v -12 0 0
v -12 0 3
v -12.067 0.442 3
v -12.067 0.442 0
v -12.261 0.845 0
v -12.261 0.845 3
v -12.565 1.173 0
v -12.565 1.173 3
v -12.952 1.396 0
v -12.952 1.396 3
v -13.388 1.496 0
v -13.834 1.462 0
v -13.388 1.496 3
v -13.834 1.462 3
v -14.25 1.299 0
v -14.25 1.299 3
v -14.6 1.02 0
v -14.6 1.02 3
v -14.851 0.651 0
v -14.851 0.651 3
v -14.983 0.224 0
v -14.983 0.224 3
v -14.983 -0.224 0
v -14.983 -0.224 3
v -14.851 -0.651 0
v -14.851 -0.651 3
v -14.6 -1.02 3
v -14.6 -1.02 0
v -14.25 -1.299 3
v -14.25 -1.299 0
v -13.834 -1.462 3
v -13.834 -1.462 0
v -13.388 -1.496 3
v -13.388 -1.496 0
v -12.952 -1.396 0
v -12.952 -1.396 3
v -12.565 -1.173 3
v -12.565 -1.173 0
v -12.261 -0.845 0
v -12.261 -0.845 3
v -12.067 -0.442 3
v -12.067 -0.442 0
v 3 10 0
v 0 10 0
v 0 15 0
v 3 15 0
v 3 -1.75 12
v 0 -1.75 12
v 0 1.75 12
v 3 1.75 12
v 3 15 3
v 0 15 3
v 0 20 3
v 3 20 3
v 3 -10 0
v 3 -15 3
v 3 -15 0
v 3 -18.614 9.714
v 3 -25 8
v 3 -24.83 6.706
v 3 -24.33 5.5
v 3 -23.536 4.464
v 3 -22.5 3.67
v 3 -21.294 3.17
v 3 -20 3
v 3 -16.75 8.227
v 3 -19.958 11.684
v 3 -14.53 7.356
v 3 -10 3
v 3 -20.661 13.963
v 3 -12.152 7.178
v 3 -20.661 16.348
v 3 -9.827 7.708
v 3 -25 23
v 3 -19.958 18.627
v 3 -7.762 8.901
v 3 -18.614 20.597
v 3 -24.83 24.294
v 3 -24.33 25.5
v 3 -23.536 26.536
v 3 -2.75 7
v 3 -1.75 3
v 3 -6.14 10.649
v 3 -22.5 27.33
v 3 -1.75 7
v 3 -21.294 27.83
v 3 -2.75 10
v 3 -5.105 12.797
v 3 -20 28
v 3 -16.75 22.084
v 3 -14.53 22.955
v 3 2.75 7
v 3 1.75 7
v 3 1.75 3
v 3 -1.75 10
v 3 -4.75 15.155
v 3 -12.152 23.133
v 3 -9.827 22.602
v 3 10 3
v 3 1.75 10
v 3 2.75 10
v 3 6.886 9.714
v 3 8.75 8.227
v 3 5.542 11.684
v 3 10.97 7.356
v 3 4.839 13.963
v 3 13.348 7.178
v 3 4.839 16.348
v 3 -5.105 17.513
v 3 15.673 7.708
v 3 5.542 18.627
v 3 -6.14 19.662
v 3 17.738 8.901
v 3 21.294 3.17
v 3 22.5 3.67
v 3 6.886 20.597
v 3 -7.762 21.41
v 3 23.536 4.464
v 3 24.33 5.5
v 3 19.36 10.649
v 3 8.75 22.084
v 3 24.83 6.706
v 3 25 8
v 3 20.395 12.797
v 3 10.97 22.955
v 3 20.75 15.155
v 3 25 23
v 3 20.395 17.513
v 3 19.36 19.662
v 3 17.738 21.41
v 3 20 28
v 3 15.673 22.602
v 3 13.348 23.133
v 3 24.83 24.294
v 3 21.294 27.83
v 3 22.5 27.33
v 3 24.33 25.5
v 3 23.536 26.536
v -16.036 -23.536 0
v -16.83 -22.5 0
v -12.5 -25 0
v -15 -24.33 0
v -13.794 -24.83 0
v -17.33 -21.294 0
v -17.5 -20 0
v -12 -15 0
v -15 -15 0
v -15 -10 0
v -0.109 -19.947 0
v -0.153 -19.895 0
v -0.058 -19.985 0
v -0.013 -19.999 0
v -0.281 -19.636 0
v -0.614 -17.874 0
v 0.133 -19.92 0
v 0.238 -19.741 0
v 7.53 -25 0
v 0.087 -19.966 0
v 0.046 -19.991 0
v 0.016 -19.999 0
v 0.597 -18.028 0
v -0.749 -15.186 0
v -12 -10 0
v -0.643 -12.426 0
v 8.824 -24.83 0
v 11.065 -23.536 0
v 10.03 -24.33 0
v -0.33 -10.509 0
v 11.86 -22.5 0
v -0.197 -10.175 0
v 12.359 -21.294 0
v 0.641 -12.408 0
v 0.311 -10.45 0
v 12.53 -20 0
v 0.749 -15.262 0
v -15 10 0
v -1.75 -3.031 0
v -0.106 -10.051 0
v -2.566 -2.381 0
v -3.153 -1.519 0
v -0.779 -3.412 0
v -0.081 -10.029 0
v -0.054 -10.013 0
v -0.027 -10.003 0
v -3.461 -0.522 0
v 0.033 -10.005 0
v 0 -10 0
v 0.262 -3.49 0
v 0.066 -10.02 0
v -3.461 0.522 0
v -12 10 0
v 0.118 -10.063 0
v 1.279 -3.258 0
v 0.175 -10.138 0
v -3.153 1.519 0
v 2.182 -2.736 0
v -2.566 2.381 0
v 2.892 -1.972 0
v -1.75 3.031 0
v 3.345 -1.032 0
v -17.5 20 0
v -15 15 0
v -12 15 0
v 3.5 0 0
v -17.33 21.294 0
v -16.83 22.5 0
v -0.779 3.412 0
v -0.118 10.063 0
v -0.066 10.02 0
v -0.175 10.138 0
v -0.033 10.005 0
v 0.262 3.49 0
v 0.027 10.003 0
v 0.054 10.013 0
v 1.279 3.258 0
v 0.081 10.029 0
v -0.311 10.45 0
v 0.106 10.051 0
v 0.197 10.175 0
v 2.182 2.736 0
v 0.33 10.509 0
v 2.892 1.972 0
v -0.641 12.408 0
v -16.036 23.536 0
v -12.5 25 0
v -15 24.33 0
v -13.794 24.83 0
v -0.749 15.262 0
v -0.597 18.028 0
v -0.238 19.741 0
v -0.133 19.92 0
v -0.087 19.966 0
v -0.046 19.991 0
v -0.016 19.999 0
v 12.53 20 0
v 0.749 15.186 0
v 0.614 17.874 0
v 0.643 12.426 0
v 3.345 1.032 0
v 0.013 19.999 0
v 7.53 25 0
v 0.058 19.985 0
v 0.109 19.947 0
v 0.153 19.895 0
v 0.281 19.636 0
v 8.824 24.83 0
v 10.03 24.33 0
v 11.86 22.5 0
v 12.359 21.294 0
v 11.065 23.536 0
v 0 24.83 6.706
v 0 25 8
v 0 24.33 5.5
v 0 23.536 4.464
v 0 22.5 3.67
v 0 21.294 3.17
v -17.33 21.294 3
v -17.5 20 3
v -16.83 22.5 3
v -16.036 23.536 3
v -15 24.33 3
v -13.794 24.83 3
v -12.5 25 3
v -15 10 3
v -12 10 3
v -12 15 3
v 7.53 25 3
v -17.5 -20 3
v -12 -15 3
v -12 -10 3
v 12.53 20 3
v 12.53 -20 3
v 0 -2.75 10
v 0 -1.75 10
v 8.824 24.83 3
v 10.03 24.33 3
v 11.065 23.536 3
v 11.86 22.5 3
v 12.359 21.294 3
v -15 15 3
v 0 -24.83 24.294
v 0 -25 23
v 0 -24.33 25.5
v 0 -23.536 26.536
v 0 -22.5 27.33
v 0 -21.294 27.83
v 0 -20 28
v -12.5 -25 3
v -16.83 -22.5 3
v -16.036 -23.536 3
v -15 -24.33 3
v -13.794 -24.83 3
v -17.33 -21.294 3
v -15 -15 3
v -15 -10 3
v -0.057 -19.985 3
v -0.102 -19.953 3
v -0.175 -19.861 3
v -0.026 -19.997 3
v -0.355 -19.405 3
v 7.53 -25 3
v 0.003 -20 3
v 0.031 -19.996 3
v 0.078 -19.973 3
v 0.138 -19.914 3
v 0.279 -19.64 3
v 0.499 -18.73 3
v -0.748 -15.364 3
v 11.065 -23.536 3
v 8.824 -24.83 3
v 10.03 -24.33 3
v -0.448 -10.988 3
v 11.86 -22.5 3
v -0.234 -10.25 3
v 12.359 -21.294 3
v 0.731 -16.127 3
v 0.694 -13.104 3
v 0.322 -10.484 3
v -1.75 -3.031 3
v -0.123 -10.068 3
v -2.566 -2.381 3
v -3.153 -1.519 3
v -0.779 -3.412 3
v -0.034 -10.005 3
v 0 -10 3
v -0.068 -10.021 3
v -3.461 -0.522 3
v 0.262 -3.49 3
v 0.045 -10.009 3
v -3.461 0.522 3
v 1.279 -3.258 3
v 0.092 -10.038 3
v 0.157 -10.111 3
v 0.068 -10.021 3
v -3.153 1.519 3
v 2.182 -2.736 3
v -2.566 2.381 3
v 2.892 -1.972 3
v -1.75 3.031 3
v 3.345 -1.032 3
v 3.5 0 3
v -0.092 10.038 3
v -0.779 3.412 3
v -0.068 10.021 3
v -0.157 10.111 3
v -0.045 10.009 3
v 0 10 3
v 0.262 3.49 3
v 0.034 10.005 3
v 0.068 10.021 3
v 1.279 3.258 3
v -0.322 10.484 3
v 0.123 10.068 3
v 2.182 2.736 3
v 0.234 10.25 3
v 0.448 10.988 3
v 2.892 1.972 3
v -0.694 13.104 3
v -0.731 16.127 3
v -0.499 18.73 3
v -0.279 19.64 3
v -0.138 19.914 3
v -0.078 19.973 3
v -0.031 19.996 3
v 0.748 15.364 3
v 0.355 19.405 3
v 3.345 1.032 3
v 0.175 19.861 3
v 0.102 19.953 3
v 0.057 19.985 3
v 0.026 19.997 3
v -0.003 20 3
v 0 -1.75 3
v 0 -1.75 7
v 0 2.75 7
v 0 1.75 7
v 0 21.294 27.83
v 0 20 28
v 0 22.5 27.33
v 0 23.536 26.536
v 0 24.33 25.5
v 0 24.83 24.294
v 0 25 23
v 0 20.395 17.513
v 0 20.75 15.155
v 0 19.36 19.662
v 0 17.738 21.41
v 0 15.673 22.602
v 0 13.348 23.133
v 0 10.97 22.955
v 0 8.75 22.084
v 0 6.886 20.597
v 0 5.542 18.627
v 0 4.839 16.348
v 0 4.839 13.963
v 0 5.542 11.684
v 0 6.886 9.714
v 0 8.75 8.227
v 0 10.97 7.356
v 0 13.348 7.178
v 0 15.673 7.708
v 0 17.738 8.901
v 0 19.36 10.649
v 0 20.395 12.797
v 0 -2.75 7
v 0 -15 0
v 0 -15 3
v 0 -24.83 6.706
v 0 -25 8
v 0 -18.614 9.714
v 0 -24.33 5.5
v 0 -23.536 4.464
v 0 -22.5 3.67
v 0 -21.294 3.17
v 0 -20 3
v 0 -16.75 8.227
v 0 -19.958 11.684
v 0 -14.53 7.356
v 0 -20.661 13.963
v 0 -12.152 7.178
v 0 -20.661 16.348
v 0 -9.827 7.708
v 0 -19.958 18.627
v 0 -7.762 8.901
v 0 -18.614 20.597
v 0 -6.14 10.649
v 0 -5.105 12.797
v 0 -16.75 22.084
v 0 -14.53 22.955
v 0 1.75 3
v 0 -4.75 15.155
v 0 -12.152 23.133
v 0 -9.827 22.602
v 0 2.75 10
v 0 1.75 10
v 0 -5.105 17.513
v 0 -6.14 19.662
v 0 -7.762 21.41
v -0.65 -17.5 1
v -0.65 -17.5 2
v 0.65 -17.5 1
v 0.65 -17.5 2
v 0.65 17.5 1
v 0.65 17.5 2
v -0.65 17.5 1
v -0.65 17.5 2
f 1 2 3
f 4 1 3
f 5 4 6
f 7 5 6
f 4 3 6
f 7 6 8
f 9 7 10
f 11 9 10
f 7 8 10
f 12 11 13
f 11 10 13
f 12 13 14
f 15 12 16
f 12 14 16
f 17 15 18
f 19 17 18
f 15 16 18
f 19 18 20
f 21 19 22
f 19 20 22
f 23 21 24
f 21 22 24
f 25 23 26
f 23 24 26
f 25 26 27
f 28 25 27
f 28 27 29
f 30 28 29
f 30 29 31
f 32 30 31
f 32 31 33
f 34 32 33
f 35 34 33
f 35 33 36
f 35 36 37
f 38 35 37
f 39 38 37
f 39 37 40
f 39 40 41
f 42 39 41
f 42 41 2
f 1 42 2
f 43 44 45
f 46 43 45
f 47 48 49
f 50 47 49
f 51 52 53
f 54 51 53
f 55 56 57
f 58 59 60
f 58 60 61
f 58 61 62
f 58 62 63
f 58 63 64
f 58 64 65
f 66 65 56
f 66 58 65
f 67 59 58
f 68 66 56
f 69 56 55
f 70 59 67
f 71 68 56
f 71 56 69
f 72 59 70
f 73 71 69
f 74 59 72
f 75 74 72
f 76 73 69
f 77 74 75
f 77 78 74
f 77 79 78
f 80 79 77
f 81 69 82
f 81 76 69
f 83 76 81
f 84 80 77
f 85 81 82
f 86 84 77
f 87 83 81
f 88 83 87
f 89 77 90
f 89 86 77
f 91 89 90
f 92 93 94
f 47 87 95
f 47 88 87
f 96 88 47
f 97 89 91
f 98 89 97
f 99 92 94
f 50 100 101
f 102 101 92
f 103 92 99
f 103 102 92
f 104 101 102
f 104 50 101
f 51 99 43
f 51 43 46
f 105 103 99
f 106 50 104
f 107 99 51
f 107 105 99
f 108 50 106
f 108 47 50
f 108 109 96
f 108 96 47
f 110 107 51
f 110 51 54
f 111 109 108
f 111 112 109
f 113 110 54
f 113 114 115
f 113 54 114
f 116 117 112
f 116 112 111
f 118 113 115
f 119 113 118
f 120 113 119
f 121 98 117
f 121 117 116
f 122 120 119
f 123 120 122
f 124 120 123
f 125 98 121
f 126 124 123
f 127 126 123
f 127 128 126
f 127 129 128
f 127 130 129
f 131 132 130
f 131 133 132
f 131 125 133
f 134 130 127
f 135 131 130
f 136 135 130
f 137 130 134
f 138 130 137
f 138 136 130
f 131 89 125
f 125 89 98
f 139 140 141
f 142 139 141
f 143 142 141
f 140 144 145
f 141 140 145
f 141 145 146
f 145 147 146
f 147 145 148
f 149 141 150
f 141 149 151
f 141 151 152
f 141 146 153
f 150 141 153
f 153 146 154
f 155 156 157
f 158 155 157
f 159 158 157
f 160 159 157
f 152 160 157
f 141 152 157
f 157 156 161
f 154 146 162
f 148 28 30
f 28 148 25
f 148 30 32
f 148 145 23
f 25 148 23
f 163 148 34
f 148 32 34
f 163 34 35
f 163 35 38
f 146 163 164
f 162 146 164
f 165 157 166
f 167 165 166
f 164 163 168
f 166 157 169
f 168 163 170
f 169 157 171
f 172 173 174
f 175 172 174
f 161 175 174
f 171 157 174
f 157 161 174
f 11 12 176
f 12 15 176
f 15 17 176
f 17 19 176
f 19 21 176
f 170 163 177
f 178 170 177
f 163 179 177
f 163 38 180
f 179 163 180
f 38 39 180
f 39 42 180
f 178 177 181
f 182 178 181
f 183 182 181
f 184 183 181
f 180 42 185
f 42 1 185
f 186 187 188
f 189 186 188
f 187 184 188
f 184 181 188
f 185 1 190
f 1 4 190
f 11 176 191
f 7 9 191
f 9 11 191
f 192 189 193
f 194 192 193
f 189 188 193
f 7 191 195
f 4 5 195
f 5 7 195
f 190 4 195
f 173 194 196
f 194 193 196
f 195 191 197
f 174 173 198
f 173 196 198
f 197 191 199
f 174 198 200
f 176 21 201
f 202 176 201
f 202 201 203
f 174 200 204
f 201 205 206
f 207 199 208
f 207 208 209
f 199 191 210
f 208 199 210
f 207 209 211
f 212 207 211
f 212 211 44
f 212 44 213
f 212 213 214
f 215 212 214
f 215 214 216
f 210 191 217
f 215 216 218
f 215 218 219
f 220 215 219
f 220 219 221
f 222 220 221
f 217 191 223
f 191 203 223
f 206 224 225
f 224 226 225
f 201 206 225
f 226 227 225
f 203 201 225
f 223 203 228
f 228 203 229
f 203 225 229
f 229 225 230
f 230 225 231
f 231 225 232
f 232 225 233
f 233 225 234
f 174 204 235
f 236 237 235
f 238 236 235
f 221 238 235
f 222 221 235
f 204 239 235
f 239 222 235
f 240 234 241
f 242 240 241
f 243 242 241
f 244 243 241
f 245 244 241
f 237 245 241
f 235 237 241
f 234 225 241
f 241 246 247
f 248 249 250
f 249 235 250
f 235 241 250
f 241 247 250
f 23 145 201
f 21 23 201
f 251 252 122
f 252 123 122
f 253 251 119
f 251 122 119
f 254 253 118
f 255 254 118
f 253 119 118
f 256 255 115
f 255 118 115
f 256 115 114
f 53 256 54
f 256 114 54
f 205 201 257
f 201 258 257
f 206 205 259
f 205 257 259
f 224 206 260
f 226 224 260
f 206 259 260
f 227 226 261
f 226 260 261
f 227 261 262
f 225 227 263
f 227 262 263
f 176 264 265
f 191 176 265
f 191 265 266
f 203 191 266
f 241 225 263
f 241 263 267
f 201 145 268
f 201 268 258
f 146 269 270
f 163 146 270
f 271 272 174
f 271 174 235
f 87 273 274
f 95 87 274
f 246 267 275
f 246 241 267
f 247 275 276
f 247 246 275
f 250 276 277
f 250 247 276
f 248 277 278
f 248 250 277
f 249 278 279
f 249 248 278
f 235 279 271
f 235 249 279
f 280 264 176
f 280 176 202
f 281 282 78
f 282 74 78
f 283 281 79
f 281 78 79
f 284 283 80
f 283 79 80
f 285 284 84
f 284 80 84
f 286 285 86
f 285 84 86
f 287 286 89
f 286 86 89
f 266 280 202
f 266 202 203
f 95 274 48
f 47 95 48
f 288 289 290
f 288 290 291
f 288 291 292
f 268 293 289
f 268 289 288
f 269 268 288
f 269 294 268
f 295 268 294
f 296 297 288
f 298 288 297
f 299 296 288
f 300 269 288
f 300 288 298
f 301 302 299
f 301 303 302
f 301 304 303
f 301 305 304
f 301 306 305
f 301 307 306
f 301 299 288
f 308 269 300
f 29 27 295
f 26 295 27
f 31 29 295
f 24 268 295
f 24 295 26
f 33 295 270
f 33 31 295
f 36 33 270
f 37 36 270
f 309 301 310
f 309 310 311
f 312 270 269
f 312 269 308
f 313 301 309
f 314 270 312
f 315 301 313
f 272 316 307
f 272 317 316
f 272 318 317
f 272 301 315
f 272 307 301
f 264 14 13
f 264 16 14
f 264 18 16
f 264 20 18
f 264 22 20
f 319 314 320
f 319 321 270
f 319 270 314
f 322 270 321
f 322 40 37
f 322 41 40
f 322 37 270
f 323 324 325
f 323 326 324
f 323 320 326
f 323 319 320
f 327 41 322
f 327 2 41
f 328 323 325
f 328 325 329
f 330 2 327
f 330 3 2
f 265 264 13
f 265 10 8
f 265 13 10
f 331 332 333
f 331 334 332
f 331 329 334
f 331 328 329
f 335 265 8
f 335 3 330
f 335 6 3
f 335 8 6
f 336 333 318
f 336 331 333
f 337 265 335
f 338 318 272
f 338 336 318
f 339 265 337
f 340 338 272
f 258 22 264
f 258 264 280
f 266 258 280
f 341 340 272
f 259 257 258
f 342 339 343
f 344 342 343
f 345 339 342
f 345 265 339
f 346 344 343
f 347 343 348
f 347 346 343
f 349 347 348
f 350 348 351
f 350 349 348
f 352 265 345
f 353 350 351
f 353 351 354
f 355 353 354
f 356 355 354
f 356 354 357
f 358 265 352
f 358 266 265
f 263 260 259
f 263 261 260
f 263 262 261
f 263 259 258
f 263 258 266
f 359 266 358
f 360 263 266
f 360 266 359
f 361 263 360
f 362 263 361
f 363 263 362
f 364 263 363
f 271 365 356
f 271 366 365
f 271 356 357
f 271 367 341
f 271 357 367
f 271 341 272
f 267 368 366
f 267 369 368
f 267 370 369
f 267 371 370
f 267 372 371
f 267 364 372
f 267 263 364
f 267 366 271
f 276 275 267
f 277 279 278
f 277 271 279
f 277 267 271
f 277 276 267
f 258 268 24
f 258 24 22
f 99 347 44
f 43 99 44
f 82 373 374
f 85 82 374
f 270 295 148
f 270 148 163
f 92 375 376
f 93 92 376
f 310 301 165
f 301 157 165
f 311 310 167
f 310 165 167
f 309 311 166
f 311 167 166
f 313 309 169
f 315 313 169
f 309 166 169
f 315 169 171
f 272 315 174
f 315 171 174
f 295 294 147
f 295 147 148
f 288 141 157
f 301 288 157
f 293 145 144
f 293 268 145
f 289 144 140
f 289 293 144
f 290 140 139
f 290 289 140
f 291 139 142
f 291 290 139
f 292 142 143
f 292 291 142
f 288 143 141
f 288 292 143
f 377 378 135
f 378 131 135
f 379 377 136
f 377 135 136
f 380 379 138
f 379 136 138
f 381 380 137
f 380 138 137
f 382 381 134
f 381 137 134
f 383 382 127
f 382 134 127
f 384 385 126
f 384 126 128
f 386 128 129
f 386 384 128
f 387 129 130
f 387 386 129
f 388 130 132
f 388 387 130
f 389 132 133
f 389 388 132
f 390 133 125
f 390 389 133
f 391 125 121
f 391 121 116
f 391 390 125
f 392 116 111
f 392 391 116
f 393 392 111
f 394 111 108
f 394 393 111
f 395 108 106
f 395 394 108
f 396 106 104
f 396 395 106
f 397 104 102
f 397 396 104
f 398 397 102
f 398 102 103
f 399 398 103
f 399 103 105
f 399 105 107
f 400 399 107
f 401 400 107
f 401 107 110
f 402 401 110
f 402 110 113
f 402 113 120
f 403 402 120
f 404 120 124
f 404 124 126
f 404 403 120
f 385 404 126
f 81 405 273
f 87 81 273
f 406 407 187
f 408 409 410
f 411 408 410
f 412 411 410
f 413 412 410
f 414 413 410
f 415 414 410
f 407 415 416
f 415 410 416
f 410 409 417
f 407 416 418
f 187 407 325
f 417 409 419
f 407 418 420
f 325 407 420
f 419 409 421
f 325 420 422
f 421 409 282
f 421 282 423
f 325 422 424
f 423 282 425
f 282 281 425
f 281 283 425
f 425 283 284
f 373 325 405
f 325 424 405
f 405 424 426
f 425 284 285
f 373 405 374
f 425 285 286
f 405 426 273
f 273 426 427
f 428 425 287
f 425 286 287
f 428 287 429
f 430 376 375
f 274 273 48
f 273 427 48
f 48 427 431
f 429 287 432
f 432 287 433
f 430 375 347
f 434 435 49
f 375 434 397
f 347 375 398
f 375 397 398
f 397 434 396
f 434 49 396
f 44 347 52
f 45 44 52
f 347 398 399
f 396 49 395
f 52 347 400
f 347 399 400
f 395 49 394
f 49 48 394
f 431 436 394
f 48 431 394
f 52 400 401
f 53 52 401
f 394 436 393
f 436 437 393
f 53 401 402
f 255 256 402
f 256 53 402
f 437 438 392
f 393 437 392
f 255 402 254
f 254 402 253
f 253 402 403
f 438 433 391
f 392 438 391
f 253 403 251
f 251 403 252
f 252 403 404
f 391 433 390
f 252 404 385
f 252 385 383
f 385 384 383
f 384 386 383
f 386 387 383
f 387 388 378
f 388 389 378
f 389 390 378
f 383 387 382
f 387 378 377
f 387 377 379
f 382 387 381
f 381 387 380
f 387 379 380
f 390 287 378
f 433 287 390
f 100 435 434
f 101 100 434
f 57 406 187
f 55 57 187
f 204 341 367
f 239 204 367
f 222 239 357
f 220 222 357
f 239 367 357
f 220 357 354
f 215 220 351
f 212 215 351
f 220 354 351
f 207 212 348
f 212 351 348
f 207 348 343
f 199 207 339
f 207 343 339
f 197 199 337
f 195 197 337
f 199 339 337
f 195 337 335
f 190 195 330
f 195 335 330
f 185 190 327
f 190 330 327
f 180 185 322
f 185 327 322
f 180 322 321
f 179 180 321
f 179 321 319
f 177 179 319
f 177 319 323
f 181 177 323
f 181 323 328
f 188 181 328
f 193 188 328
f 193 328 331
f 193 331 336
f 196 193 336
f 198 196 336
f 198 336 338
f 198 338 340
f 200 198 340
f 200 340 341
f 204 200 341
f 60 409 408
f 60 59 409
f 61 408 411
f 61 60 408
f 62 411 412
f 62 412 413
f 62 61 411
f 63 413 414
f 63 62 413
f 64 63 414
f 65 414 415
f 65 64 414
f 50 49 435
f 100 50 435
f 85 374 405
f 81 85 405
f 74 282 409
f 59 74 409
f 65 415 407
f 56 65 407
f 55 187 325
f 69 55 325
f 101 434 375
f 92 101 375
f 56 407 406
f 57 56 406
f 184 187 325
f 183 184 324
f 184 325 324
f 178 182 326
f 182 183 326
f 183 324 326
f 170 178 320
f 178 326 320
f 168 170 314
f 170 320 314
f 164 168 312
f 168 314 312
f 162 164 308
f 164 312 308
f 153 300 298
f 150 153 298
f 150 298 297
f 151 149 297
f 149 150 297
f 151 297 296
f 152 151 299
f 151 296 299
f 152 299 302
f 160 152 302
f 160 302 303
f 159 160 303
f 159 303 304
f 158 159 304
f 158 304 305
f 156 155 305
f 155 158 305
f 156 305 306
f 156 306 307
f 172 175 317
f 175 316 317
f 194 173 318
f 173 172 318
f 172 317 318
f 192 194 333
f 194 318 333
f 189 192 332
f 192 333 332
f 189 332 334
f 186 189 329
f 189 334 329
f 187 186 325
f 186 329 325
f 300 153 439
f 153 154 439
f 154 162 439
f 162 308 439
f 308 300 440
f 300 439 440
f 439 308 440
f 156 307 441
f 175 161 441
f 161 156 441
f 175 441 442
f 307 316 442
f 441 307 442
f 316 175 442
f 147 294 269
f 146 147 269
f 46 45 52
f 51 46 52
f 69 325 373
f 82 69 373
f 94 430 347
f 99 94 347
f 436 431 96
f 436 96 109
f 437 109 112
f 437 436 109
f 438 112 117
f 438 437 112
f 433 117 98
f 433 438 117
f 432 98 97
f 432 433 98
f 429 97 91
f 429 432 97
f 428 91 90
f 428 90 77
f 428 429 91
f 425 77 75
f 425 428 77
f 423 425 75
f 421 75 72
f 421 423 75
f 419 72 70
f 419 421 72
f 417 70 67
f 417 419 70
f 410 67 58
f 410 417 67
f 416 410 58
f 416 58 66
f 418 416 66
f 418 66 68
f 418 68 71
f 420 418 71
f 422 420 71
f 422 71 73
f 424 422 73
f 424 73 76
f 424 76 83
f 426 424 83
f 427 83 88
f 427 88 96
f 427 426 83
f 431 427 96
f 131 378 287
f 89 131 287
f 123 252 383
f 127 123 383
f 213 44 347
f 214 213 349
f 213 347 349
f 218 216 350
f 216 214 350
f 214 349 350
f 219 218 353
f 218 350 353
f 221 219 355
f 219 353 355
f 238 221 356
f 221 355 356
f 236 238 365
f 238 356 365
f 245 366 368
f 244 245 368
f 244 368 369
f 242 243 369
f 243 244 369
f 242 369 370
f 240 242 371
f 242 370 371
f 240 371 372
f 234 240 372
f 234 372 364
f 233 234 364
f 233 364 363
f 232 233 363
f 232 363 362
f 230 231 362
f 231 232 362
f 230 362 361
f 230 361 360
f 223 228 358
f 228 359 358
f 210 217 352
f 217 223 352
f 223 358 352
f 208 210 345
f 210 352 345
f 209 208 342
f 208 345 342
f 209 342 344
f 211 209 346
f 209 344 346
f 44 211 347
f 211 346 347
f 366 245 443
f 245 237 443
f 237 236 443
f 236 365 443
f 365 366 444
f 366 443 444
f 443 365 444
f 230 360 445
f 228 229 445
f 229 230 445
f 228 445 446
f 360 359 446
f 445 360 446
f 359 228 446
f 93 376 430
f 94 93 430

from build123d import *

# Parameters (mm, degrees)
F0_W     = 35
F0_H     = 50
F1_DEPTH = 3
F2_W     = 3
F2_H     = 5
F2_R     = 1.5
F2_R_2   = 3.5
F2_W_2   = 4.9703744426
F2_H_2   = 50
F3_DEPTH = 25
F4_R     = 8
F5_DEPTH = 3
F6_R     = 5
F7_R     = 5


with BuildPart() as f1:
    # F0 (on Top) → F1 (new body)
    with BuildSketch(Plane.XY):
        Rectangle(F0_W, F0_H)
    extrude(amount=F1_DEPTH)

    # F2 (on face) → F3 (cut)
    with BuildSketch(Plane.XY.offset(3)):
        with Locations((-13.5, -12.5)):
            Rectangle(F2_W, F2_H)
        with Locations((-13.5, 12.5)):
            Rectangle(F2_W, F2_H)
        with Locations((-13.5, 0)):
            Circle(F2_R)
        Circle(F2_R_2)
        with BuildLine():
            add(Edge.make_bspline(
                [(0, -10), (-1.2990381057, -10), (-0.6495190528, -17.5), (0, -25), (0.6495190528, -17.5), (1.2990381057, -10), (0, -10)],
                knots=[0, 0, 0, 2.0943951024, 2.0943951024, 4.1887902048, 4.1887902048, 6.2831853072, 6.2831853072, 6.2831853072], degree=2, weights=[1, 0.5, 1, 0.5, 1, 0.5, 1]))
        make_face()
        with BuildLine():
            add(Edge.make_bspline(
                [(0, 10), (1.2990381057, 10), (0.6495190528, 17.5), (0, 25), (-0.6495190528, 17.5), (-1.2990381057, 10), (0, 10)],
                knots=[0, 0, 0, 2.0943951024, 2.0943951024, 4.1887902048, 4.1887902048, 6.2831853072, 6.2831853072, 6.2831853072], degree=2, weights=[1, 0.5, 1, 0.5, 1, 0.5, 1]))
        make_face()
        with Locations((15.0148127787, 0)):
            Rectangle(F2_W_2, F2_H_2)
    extrude(amount=-F3_DEPTH, mode=Mode.SUBTRACT)

    # F6
    f6_edges = [f1.edges().sort_by_distance(p)[0] for p in [
        (12.529626, 25, 1.5),
        (12.529626, -25, 1.5),
        (-17.5, -25, 1.5),
        (-17.5, 25, 1.5),
    ]]
    fillet(f6_edges, radius=F6_R)


with BuildPart() as f5:
    # F4 (on Right) → F5 (new body)
    with BuildSketch(Plane.YZ):
        Polygon((-25, 28), (-25, 3), (-15, 3), (-15, 0), (-10, 0), (-10, 3), (-1.75, 3), (-1.75, 7), (-2.75, 7), (-2.75, 10), (-1.75, 10), (-1.75, 12), (1.75, 12), (1.75, 10), (2.75, 10), (2.75, 7), (1.75, 7), (1.75, 3), (10, 3), (10, 0), (15, 0), (15, 3), (25, 3), (25, 28), align=None)
        with Locations((-12.75, 15.1554467157)):
            Circle(F4_R, mode=Mode.SUBTRACT)
        with Locations((12.75, 15.1554467157)):
            Circle(F4_R, mode=Mode.SUBTRACT)
    extrude(amount=F5_DEPTH)

    # F7
    f7_edges = [f5.edges().sort_by_distance(p)[0] for p in [
        (1.5, -25, 3),
        (1.5, -25, 28),
        (1.5, 25, 28),
        (1.5, 25, 3),
    ]]
    fillet(f7_edges, radius=F7_R)


solid = Compound([f1.part, f5.part])
